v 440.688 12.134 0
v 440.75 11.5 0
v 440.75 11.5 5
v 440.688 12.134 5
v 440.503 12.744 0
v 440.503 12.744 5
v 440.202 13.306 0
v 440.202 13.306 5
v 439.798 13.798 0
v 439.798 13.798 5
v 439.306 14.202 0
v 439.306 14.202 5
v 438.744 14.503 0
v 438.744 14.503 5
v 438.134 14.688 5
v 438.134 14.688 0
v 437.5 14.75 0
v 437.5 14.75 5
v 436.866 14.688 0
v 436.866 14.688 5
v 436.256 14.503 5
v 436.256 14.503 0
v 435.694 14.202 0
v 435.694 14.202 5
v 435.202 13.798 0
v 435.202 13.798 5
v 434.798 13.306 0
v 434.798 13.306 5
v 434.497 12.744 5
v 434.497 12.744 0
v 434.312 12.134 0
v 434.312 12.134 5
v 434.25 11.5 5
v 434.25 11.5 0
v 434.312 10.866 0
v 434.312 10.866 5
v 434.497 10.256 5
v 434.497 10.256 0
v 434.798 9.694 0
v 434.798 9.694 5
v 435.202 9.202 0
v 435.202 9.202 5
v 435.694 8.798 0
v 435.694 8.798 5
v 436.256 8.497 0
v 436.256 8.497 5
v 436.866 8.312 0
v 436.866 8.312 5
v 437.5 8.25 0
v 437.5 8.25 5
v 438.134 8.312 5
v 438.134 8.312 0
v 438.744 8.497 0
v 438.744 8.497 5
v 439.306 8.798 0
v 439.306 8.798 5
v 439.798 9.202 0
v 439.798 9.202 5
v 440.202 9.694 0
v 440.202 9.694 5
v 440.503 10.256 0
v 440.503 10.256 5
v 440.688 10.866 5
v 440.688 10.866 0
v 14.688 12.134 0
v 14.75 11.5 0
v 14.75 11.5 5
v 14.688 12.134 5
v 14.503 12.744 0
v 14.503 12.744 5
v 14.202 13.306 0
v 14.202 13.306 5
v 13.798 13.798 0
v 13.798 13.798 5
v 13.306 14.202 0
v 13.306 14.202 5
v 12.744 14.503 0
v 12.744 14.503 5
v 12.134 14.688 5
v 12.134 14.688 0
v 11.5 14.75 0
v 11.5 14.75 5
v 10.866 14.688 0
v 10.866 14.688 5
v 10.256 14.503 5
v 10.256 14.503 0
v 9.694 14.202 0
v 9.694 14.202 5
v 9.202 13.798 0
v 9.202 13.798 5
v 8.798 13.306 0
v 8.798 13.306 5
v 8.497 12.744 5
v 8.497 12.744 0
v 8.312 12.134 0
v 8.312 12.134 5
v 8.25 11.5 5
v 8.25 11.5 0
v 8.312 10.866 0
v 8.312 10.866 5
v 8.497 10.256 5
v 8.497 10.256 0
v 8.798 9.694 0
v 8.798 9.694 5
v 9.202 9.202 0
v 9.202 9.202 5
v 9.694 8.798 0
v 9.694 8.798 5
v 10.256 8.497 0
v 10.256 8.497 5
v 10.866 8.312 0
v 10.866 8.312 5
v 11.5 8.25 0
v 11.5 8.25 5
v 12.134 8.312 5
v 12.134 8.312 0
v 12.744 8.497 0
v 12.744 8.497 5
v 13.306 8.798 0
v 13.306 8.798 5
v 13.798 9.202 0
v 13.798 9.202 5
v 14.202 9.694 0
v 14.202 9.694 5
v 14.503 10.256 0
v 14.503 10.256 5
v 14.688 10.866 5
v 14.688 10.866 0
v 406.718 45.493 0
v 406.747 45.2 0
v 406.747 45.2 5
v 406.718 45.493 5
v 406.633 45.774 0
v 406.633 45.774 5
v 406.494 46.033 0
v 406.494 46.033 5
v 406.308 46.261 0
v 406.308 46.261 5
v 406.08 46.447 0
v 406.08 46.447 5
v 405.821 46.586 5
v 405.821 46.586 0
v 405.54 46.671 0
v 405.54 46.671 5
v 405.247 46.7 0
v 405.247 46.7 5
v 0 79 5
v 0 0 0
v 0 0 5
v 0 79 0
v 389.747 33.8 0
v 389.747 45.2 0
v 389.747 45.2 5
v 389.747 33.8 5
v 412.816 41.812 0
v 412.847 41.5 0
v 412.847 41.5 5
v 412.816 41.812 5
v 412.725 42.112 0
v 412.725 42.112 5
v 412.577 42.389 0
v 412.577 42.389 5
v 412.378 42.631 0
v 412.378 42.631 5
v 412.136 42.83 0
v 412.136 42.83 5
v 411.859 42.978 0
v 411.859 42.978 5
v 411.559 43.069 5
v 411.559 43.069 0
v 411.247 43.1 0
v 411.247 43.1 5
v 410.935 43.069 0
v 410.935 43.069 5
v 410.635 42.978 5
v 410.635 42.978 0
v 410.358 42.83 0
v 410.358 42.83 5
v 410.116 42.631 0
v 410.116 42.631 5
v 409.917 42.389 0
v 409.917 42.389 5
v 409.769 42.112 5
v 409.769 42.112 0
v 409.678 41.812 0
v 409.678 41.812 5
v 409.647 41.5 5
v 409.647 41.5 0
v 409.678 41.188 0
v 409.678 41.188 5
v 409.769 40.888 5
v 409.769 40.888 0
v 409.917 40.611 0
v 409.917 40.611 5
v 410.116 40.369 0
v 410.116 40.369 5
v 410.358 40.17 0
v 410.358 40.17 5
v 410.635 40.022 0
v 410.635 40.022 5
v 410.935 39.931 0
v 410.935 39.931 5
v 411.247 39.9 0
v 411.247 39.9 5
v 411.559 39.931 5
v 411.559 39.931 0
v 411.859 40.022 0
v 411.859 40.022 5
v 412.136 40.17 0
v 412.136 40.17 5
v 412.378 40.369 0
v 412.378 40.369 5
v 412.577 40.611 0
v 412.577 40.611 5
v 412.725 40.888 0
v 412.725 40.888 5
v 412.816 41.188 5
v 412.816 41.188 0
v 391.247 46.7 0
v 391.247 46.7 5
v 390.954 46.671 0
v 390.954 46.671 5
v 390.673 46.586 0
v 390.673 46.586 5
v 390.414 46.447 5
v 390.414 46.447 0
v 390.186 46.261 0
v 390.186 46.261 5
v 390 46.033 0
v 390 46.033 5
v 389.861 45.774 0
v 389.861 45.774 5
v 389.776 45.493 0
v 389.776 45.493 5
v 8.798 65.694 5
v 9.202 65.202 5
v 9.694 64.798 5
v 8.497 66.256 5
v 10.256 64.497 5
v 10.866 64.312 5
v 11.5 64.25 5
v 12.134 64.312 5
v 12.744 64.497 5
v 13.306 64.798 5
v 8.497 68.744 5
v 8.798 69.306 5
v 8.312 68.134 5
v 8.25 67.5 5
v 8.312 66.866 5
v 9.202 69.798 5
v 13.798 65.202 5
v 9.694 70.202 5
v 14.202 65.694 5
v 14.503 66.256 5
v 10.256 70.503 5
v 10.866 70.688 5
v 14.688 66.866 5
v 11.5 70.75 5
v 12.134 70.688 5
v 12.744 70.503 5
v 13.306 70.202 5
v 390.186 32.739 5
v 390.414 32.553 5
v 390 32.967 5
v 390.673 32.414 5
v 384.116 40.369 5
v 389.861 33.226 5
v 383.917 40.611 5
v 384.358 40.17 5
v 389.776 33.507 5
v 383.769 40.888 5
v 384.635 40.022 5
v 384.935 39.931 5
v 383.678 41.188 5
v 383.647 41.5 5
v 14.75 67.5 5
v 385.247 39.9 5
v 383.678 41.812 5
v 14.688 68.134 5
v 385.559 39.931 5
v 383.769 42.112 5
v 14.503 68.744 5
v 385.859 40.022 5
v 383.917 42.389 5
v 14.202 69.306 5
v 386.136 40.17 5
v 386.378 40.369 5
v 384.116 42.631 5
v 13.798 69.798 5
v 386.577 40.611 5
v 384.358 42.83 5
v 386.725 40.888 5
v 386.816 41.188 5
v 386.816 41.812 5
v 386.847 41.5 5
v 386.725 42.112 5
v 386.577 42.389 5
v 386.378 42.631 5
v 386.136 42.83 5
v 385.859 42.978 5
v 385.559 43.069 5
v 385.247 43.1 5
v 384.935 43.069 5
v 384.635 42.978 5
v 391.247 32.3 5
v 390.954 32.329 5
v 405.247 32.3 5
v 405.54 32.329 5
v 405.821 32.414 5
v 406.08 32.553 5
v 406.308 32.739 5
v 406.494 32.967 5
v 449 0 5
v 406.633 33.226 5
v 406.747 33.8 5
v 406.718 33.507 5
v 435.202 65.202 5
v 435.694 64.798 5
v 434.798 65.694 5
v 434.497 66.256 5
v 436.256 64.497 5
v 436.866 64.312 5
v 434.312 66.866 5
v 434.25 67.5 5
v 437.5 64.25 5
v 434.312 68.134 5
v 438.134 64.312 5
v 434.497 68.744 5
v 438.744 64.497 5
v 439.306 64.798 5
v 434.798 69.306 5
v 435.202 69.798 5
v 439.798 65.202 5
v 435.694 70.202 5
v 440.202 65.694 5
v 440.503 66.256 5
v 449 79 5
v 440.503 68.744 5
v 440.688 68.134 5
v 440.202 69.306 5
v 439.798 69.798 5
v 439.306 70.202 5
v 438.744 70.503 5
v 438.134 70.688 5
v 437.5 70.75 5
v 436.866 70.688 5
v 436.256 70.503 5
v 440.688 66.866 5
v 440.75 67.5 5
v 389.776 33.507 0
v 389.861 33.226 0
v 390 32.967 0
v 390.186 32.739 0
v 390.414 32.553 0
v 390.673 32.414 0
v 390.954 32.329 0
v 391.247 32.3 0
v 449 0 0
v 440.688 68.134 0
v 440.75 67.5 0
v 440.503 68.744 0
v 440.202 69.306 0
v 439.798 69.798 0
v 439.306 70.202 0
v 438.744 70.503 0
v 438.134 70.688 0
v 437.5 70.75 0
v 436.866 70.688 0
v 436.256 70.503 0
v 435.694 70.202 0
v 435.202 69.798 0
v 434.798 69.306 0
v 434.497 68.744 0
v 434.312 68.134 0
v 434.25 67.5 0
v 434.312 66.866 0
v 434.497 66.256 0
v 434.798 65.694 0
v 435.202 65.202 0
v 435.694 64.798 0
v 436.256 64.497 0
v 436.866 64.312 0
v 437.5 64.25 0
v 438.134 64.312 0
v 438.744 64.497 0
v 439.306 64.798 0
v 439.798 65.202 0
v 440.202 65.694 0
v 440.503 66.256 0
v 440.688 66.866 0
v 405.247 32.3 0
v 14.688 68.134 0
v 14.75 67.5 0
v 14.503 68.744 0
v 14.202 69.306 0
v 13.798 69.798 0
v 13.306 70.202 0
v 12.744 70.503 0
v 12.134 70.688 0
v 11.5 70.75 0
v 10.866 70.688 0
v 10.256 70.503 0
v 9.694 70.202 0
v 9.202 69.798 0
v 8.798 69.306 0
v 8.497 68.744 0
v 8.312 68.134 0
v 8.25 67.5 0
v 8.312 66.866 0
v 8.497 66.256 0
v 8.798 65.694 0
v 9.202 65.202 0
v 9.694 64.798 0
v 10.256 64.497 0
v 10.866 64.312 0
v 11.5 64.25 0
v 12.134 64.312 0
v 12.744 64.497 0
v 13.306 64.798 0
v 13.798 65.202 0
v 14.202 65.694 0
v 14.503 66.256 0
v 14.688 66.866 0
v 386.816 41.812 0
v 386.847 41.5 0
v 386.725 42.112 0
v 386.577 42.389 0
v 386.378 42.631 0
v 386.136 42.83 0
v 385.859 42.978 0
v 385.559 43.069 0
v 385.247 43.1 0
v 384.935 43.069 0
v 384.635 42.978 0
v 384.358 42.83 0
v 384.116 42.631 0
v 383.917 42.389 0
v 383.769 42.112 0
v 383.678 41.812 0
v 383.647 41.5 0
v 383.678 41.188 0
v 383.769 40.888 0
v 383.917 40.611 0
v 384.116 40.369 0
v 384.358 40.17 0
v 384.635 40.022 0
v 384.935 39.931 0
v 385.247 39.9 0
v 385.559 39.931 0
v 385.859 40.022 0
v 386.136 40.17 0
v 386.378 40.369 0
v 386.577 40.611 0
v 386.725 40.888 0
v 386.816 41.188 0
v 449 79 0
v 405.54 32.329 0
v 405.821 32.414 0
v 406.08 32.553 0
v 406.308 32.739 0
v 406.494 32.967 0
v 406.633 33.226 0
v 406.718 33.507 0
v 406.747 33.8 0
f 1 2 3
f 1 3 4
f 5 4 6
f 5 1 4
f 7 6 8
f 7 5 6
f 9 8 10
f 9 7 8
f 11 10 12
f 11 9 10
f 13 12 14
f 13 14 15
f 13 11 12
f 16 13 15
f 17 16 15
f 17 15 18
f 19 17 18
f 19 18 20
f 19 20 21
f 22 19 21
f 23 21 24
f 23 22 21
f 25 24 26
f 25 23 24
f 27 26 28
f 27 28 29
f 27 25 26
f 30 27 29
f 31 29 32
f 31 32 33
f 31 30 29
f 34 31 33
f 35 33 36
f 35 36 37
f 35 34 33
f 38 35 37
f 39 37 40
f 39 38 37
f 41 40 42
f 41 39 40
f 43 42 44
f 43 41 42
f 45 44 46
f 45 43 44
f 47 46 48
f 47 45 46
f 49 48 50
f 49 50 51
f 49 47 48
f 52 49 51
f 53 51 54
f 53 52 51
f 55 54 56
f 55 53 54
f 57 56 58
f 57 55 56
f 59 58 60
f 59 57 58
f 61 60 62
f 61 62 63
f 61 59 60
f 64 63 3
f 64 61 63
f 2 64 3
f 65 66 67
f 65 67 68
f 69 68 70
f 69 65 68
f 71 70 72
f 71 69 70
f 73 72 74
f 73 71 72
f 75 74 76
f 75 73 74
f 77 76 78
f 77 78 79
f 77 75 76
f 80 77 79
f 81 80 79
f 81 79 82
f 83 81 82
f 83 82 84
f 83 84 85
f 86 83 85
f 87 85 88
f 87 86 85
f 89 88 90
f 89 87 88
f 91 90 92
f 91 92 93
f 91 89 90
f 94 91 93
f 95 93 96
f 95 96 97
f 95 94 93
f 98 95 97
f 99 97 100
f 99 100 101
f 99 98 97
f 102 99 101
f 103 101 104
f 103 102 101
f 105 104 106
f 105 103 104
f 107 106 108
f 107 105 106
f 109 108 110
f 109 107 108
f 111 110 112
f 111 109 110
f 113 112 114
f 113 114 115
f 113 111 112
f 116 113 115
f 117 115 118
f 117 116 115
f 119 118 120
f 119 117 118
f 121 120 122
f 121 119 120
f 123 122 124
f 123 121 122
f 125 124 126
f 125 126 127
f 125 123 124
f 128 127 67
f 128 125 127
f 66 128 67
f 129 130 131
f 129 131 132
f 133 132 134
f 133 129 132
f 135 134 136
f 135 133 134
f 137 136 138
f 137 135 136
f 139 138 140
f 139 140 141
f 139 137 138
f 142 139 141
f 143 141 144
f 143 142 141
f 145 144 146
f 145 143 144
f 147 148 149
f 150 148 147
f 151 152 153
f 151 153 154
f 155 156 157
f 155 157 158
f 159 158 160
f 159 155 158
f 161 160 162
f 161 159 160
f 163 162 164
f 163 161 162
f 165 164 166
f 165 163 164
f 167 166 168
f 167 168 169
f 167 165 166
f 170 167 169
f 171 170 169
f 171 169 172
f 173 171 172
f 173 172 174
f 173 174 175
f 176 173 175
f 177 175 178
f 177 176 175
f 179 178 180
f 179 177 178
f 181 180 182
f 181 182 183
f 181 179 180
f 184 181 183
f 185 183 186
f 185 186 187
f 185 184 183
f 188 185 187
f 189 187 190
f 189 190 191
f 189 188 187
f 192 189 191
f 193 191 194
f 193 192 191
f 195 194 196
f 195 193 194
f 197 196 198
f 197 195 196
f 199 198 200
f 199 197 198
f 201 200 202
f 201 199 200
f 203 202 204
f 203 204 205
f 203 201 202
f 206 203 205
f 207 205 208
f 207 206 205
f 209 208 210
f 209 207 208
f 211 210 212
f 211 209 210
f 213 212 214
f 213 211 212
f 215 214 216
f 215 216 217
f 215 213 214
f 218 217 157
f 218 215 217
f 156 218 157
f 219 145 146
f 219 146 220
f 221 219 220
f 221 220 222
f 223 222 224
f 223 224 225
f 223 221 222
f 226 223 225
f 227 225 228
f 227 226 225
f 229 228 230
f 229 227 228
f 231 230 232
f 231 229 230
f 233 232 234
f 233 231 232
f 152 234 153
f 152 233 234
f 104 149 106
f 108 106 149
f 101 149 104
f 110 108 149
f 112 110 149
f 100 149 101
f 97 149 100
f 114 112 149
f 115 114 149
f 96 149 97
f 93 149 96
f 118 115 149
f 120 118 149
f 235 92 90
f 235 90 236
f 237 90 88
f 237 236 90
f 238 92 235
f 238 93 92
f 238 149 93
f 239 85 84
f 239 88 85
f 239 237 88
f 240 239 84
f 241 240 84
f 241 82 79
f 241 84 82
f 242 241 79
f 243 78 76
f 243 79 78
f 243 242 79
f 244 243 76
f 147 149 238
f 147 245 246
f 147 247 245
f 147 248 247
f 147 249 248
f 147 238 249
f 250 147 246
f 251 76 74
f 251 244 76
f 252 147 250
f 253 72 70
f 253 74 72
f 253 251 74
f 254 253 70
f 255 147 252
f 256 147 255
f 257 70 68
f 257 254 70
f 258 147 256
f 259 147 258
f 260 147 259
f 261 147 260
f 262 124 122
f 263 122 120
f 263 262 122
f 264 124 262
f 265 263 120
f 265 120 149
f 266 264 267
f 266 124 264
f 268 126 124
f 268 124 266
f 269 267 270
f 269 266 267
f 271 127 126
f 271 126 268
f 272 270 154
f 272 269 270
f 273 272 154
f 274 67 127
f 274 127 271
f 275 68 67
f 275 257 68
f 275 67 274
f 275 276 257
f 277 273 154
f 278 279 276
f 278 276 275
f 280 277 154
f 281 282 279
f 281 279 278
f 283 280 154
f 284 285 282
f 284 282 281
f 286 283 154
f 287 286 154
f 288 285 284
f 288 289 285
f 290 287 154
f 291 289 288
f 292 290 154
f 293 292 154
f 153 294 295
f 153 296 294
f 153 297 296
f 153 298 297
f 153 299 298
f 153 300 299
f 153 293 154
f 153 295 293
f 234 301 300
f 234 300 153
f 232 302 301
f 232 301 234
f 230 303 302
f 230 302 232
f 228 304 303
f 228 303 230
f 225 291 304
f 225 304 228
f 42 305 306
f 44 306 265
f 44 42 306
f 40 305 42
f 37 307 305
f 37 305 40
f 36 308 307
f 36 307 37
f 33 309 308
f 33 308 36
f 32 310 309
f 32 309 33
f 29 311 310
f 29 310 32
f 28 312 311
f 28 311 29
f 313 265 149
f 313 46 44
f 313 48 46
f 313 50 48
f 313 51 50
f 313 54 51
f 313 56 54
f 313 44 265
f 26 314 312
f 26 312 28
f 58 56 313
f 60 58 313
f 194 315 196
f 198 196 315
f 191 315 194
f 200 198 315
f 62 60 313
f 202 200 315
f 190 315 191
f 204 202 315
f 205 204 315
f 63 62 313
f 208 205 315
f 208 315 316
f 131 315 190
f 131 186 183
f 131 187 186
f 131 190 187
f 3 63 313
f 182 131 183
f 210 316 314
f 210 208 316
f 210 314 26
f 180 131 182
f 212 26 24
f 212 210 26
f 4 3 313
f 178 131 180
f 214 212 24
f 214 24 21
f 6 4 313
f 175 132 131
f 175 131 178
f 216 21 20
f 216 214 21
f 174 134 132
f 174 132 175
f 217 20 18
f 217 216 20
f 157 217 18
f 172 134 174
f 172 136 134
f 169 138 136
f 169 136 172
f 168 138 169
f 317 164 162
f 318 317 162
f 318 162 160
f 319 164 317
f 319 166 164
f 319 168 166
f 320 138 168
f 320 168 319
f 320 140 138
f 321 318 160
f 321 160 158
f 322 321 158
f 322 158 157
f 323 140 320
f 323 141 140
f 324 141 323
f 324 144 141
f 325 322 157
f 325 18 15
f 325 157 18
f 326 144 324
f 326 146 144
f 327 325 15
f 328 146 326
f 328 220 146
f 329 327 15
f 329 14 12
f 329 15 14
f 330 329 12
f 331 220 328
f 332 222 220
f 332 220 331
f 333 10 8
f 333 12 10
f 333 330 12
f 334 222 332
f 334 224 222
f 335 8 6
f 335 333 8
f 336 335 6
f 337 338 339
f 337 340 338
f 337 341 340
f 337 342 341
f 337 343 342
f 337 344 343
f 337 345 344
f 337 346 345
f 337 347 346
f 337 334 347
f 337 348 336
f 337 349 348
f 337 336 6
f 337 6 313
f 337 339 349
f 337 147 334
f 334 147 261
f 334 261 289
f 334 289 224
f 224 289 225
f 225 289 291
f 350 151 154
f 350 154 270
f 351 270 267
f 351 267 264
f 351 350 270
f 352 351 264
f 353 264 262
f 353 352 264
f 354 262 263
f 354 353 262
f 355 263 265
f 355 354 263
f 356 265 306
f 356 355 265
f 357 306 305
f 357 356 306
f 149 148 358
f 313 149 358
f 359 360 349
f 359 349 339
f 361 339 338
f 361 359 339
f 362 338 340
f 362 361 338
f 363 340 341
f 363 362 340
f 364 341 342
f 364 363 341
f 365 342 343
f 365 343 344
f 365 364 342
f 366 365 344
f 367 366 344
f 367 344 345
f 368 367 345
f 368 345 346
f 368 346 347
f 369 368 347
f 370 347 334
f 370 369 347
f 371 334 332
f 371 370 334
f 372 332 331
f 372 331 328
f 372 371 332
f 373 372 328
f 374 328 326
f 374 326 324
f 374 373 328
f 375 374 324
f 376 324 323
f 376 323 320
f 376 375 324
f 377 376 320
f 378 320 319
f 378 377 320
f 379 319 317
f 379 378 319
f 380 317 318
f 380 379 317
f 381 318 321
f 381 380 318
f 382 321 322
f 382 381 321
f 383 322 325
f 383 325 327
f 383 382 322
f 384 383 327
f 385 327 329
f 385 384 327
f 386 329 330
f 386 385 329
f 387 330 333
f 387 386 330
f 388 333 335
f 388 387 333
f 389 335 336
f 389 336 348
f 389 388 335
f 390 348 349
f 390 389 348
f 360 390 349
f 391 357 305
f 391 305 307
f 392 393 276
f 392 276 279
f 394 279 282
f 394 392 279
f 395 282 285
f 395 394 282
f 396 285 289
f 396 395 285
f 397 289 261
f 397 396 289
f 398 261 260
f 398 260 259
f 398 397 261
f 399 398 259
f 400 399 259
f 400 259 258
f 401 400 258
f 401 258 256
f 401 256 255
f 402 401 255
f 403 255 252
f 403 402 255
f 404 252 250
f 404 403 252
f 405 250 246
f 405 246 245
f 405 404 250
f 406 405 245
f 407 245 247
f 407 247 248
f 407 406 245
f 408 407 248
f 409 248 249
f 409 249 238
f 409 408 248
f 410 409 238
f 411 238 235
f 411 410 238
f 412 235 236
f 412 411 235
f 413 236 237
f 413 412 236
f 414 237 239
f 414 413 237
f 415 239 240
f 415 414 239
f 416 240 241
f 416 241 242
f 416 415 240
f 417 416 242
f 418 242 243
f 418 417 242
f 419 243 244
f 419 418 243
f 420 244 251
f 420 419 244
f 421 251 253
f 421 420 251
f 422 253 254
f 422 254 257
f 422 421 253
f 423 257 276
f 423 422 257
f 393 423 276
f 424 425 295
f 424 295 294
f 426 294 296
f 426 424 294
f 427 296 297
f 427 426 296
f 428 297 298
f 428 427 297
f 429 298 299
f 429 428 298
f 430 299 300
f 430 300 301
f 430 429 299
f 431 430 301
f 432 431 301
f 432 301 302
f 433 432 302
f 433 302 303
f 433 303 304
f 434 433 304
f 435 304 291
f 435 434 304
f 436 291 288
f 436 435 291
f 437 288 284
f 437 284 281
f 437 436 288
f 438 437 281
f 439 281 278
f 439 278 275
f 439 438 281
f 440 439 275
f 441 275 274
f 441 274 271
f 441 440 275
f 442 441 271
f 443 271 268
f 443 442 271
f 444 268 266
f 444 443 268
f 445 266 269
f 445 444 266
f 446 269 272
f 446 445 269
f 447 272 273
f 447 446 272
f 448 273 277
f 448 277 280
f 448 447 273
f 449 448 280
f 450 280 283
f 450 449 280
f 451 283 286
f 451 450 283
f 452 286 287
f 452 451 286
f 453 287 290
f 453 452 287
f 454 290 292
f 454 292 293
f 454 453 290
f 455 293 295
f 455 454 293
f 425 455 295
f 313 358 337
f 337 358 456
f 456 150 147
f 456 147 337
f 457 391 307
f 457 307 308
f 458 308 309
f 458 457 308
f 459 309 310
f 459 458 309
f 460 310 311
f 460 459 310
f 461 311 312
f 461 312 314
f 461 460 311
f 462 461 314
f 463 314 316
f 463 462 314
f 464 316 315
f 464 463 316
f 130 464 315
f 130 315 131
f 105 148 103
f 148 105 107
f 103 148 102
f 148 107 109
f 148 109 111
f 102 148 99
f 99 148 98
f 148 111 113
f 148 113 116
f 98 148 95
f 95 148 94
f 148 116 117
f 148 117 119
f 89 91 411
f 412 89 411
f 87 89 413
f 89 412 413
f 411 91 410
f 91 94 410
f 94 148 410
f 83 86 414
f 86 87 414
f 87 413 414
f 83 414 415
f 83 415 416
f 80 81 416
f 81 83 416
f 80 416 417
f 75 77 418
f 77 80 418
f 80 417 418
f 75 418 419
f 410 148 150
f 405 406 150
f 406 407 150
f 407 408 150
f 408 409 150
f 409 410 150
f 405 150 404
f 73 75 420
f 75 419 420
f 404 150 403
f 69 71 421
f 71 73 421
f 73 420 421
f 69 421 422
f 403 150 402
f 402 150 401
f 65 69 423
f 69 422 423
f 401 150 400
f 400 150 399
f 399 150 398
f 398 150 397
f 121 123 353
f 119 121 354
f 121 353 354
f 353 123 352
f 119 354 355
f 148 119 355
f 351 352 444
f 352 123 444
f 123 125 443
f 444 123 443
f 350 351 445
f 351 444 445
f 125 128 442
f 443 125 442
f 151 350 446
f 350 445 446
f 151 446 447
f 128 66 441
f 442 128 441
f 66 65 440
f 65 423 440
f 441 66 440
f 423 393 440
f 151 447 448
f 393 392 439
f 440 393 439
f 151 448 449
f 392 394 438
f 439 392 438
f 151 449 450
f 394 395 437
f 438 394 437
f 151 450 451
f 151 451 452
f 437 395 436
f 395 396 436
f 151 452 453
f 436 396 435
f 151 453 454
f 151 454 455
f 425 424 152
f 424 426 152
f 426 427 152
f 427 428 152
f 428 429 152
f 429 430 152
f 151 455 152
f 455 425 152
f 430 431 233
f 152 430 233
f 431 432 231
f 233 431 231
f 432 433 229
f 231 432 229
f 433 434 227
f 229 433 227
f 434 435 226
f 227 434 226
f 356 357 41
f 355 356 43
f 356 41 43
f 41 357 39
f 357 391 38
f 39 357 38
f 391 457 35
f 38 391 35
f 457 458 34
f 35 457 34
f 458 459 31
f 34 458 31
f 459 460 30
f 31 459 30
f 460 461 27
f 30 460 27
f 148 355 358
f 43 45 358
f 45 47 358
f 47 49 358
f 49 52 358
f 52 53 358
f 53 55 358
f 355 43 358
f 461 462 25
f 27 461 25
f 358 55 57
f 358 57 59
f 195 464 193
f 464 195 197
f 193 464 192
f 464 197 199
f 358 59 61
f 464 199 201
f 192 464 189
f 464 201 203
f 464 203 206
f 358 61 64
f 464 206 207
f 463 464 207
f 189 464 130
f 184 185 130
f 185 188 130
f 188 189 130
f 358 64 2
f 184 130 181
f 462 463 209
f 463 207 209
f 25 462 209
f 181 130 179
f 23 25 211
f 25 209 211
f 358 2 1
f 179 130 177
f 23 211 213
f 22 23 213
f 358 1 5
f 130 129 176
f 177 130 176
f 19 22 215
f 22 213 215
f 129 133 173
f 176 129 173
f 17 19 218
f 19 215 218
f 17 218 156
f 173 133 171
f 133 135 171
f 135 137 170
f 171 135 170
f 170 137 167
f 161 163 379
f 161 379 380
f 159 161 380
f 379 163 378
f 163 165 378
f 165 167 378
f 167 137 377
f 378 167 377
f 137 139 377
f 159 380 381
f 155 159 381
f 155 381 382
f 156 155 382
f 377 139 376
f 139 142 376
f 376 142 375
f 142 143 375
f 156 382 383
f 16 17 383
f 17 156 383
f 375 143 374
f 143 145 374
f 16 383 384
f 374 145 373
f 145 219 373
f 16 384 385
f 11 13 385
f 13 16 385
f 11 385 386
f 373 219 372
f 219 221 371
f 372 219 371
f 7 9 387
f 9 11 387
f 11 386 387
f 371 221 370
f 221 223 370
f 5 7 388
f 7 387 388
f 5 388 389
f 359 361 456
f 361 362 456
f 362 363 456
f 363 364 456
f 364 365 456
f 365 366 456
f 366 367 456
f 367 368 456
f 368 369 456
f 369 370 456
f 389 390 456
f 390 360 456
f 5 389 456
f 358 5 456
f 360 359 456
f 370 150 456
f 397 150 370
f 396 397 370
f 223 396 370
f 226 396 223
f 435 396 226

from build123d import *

# Parameters (mm, degrees)
SKETCH_F_W                   = 449
SKETCH_F_H                   = 79
SKETCH_F_R                   = 3.25
SKETCH_F_R_2                 = 1.6
ESTRUSIONE_ESTRUSIONE1_DEPTH = 5


with BuildPart() as part:
    # Sketch f → Estrusione-Estrusione1 (new body)
    with BuildSketch(Plane.XY):
        with Locations((224.5, 39.5)):
            Rectangle(SKETCH_F_W, SKETCH_F_H)
        with Locations((11.5, 67.5)):
            Circle(SKETCH_F_R, mode=Mode.SUBTRACT)
        with Locations((437.5, 67.5)):
            Circle(SKETCH_F_R, mode=Mode.SUBTRACT)
        with Locations((11.5, 11.5)):
            Circle(SKETCH_F_R, mode=Mode.SUBTRACT)
        with Locations((437.5, 11.5)):
            Circle(SKETCH_F_R, mode=Mode.SUBTRACT)
        with Locations((385.246939646, 41.5)):
            Circle(SKETCH_F_R_2, mode=Mode.SUBTRACT)
        with Locations((411.246939646, 41.5)):
            Circle(SKETCH_F_R_2, mode=Mode.SUBTRACT)
        with BuildLine():
            Line((406.746939646, 33.8), (406.746939646, 45.2))
            ThreePointArc((406.746939646, 45.2), (406.307599818, 46.260660172), (405.246939646, 46.7))
            Line((405.246939646, 46.7), (391.246939646, 46.7))
            ThreePointArc((391.246939646, 46.7), (390.186279474, 46.260660172), (389.746939646, 45.2))
            Line((389.746939646, 45.2), (389.746939646, 33.8))
            ThreePointArc((389.746939646, 33.8), (390.186279474, 32.739339828), (391.246939646, 32.3))
            Line((391.246939646, 32.3), (405.246939646, 32.3))
            ThreePointArc((405.246939646, 32.3), (406.307599818, 32.739339828), (406.746939646, 33.8))
        make_face(mode=Mode.SUBTRACT)
    extrude(amount=ESTRUSIONE_ESTRUSIONE1_DEPTH)


solid = part.part
